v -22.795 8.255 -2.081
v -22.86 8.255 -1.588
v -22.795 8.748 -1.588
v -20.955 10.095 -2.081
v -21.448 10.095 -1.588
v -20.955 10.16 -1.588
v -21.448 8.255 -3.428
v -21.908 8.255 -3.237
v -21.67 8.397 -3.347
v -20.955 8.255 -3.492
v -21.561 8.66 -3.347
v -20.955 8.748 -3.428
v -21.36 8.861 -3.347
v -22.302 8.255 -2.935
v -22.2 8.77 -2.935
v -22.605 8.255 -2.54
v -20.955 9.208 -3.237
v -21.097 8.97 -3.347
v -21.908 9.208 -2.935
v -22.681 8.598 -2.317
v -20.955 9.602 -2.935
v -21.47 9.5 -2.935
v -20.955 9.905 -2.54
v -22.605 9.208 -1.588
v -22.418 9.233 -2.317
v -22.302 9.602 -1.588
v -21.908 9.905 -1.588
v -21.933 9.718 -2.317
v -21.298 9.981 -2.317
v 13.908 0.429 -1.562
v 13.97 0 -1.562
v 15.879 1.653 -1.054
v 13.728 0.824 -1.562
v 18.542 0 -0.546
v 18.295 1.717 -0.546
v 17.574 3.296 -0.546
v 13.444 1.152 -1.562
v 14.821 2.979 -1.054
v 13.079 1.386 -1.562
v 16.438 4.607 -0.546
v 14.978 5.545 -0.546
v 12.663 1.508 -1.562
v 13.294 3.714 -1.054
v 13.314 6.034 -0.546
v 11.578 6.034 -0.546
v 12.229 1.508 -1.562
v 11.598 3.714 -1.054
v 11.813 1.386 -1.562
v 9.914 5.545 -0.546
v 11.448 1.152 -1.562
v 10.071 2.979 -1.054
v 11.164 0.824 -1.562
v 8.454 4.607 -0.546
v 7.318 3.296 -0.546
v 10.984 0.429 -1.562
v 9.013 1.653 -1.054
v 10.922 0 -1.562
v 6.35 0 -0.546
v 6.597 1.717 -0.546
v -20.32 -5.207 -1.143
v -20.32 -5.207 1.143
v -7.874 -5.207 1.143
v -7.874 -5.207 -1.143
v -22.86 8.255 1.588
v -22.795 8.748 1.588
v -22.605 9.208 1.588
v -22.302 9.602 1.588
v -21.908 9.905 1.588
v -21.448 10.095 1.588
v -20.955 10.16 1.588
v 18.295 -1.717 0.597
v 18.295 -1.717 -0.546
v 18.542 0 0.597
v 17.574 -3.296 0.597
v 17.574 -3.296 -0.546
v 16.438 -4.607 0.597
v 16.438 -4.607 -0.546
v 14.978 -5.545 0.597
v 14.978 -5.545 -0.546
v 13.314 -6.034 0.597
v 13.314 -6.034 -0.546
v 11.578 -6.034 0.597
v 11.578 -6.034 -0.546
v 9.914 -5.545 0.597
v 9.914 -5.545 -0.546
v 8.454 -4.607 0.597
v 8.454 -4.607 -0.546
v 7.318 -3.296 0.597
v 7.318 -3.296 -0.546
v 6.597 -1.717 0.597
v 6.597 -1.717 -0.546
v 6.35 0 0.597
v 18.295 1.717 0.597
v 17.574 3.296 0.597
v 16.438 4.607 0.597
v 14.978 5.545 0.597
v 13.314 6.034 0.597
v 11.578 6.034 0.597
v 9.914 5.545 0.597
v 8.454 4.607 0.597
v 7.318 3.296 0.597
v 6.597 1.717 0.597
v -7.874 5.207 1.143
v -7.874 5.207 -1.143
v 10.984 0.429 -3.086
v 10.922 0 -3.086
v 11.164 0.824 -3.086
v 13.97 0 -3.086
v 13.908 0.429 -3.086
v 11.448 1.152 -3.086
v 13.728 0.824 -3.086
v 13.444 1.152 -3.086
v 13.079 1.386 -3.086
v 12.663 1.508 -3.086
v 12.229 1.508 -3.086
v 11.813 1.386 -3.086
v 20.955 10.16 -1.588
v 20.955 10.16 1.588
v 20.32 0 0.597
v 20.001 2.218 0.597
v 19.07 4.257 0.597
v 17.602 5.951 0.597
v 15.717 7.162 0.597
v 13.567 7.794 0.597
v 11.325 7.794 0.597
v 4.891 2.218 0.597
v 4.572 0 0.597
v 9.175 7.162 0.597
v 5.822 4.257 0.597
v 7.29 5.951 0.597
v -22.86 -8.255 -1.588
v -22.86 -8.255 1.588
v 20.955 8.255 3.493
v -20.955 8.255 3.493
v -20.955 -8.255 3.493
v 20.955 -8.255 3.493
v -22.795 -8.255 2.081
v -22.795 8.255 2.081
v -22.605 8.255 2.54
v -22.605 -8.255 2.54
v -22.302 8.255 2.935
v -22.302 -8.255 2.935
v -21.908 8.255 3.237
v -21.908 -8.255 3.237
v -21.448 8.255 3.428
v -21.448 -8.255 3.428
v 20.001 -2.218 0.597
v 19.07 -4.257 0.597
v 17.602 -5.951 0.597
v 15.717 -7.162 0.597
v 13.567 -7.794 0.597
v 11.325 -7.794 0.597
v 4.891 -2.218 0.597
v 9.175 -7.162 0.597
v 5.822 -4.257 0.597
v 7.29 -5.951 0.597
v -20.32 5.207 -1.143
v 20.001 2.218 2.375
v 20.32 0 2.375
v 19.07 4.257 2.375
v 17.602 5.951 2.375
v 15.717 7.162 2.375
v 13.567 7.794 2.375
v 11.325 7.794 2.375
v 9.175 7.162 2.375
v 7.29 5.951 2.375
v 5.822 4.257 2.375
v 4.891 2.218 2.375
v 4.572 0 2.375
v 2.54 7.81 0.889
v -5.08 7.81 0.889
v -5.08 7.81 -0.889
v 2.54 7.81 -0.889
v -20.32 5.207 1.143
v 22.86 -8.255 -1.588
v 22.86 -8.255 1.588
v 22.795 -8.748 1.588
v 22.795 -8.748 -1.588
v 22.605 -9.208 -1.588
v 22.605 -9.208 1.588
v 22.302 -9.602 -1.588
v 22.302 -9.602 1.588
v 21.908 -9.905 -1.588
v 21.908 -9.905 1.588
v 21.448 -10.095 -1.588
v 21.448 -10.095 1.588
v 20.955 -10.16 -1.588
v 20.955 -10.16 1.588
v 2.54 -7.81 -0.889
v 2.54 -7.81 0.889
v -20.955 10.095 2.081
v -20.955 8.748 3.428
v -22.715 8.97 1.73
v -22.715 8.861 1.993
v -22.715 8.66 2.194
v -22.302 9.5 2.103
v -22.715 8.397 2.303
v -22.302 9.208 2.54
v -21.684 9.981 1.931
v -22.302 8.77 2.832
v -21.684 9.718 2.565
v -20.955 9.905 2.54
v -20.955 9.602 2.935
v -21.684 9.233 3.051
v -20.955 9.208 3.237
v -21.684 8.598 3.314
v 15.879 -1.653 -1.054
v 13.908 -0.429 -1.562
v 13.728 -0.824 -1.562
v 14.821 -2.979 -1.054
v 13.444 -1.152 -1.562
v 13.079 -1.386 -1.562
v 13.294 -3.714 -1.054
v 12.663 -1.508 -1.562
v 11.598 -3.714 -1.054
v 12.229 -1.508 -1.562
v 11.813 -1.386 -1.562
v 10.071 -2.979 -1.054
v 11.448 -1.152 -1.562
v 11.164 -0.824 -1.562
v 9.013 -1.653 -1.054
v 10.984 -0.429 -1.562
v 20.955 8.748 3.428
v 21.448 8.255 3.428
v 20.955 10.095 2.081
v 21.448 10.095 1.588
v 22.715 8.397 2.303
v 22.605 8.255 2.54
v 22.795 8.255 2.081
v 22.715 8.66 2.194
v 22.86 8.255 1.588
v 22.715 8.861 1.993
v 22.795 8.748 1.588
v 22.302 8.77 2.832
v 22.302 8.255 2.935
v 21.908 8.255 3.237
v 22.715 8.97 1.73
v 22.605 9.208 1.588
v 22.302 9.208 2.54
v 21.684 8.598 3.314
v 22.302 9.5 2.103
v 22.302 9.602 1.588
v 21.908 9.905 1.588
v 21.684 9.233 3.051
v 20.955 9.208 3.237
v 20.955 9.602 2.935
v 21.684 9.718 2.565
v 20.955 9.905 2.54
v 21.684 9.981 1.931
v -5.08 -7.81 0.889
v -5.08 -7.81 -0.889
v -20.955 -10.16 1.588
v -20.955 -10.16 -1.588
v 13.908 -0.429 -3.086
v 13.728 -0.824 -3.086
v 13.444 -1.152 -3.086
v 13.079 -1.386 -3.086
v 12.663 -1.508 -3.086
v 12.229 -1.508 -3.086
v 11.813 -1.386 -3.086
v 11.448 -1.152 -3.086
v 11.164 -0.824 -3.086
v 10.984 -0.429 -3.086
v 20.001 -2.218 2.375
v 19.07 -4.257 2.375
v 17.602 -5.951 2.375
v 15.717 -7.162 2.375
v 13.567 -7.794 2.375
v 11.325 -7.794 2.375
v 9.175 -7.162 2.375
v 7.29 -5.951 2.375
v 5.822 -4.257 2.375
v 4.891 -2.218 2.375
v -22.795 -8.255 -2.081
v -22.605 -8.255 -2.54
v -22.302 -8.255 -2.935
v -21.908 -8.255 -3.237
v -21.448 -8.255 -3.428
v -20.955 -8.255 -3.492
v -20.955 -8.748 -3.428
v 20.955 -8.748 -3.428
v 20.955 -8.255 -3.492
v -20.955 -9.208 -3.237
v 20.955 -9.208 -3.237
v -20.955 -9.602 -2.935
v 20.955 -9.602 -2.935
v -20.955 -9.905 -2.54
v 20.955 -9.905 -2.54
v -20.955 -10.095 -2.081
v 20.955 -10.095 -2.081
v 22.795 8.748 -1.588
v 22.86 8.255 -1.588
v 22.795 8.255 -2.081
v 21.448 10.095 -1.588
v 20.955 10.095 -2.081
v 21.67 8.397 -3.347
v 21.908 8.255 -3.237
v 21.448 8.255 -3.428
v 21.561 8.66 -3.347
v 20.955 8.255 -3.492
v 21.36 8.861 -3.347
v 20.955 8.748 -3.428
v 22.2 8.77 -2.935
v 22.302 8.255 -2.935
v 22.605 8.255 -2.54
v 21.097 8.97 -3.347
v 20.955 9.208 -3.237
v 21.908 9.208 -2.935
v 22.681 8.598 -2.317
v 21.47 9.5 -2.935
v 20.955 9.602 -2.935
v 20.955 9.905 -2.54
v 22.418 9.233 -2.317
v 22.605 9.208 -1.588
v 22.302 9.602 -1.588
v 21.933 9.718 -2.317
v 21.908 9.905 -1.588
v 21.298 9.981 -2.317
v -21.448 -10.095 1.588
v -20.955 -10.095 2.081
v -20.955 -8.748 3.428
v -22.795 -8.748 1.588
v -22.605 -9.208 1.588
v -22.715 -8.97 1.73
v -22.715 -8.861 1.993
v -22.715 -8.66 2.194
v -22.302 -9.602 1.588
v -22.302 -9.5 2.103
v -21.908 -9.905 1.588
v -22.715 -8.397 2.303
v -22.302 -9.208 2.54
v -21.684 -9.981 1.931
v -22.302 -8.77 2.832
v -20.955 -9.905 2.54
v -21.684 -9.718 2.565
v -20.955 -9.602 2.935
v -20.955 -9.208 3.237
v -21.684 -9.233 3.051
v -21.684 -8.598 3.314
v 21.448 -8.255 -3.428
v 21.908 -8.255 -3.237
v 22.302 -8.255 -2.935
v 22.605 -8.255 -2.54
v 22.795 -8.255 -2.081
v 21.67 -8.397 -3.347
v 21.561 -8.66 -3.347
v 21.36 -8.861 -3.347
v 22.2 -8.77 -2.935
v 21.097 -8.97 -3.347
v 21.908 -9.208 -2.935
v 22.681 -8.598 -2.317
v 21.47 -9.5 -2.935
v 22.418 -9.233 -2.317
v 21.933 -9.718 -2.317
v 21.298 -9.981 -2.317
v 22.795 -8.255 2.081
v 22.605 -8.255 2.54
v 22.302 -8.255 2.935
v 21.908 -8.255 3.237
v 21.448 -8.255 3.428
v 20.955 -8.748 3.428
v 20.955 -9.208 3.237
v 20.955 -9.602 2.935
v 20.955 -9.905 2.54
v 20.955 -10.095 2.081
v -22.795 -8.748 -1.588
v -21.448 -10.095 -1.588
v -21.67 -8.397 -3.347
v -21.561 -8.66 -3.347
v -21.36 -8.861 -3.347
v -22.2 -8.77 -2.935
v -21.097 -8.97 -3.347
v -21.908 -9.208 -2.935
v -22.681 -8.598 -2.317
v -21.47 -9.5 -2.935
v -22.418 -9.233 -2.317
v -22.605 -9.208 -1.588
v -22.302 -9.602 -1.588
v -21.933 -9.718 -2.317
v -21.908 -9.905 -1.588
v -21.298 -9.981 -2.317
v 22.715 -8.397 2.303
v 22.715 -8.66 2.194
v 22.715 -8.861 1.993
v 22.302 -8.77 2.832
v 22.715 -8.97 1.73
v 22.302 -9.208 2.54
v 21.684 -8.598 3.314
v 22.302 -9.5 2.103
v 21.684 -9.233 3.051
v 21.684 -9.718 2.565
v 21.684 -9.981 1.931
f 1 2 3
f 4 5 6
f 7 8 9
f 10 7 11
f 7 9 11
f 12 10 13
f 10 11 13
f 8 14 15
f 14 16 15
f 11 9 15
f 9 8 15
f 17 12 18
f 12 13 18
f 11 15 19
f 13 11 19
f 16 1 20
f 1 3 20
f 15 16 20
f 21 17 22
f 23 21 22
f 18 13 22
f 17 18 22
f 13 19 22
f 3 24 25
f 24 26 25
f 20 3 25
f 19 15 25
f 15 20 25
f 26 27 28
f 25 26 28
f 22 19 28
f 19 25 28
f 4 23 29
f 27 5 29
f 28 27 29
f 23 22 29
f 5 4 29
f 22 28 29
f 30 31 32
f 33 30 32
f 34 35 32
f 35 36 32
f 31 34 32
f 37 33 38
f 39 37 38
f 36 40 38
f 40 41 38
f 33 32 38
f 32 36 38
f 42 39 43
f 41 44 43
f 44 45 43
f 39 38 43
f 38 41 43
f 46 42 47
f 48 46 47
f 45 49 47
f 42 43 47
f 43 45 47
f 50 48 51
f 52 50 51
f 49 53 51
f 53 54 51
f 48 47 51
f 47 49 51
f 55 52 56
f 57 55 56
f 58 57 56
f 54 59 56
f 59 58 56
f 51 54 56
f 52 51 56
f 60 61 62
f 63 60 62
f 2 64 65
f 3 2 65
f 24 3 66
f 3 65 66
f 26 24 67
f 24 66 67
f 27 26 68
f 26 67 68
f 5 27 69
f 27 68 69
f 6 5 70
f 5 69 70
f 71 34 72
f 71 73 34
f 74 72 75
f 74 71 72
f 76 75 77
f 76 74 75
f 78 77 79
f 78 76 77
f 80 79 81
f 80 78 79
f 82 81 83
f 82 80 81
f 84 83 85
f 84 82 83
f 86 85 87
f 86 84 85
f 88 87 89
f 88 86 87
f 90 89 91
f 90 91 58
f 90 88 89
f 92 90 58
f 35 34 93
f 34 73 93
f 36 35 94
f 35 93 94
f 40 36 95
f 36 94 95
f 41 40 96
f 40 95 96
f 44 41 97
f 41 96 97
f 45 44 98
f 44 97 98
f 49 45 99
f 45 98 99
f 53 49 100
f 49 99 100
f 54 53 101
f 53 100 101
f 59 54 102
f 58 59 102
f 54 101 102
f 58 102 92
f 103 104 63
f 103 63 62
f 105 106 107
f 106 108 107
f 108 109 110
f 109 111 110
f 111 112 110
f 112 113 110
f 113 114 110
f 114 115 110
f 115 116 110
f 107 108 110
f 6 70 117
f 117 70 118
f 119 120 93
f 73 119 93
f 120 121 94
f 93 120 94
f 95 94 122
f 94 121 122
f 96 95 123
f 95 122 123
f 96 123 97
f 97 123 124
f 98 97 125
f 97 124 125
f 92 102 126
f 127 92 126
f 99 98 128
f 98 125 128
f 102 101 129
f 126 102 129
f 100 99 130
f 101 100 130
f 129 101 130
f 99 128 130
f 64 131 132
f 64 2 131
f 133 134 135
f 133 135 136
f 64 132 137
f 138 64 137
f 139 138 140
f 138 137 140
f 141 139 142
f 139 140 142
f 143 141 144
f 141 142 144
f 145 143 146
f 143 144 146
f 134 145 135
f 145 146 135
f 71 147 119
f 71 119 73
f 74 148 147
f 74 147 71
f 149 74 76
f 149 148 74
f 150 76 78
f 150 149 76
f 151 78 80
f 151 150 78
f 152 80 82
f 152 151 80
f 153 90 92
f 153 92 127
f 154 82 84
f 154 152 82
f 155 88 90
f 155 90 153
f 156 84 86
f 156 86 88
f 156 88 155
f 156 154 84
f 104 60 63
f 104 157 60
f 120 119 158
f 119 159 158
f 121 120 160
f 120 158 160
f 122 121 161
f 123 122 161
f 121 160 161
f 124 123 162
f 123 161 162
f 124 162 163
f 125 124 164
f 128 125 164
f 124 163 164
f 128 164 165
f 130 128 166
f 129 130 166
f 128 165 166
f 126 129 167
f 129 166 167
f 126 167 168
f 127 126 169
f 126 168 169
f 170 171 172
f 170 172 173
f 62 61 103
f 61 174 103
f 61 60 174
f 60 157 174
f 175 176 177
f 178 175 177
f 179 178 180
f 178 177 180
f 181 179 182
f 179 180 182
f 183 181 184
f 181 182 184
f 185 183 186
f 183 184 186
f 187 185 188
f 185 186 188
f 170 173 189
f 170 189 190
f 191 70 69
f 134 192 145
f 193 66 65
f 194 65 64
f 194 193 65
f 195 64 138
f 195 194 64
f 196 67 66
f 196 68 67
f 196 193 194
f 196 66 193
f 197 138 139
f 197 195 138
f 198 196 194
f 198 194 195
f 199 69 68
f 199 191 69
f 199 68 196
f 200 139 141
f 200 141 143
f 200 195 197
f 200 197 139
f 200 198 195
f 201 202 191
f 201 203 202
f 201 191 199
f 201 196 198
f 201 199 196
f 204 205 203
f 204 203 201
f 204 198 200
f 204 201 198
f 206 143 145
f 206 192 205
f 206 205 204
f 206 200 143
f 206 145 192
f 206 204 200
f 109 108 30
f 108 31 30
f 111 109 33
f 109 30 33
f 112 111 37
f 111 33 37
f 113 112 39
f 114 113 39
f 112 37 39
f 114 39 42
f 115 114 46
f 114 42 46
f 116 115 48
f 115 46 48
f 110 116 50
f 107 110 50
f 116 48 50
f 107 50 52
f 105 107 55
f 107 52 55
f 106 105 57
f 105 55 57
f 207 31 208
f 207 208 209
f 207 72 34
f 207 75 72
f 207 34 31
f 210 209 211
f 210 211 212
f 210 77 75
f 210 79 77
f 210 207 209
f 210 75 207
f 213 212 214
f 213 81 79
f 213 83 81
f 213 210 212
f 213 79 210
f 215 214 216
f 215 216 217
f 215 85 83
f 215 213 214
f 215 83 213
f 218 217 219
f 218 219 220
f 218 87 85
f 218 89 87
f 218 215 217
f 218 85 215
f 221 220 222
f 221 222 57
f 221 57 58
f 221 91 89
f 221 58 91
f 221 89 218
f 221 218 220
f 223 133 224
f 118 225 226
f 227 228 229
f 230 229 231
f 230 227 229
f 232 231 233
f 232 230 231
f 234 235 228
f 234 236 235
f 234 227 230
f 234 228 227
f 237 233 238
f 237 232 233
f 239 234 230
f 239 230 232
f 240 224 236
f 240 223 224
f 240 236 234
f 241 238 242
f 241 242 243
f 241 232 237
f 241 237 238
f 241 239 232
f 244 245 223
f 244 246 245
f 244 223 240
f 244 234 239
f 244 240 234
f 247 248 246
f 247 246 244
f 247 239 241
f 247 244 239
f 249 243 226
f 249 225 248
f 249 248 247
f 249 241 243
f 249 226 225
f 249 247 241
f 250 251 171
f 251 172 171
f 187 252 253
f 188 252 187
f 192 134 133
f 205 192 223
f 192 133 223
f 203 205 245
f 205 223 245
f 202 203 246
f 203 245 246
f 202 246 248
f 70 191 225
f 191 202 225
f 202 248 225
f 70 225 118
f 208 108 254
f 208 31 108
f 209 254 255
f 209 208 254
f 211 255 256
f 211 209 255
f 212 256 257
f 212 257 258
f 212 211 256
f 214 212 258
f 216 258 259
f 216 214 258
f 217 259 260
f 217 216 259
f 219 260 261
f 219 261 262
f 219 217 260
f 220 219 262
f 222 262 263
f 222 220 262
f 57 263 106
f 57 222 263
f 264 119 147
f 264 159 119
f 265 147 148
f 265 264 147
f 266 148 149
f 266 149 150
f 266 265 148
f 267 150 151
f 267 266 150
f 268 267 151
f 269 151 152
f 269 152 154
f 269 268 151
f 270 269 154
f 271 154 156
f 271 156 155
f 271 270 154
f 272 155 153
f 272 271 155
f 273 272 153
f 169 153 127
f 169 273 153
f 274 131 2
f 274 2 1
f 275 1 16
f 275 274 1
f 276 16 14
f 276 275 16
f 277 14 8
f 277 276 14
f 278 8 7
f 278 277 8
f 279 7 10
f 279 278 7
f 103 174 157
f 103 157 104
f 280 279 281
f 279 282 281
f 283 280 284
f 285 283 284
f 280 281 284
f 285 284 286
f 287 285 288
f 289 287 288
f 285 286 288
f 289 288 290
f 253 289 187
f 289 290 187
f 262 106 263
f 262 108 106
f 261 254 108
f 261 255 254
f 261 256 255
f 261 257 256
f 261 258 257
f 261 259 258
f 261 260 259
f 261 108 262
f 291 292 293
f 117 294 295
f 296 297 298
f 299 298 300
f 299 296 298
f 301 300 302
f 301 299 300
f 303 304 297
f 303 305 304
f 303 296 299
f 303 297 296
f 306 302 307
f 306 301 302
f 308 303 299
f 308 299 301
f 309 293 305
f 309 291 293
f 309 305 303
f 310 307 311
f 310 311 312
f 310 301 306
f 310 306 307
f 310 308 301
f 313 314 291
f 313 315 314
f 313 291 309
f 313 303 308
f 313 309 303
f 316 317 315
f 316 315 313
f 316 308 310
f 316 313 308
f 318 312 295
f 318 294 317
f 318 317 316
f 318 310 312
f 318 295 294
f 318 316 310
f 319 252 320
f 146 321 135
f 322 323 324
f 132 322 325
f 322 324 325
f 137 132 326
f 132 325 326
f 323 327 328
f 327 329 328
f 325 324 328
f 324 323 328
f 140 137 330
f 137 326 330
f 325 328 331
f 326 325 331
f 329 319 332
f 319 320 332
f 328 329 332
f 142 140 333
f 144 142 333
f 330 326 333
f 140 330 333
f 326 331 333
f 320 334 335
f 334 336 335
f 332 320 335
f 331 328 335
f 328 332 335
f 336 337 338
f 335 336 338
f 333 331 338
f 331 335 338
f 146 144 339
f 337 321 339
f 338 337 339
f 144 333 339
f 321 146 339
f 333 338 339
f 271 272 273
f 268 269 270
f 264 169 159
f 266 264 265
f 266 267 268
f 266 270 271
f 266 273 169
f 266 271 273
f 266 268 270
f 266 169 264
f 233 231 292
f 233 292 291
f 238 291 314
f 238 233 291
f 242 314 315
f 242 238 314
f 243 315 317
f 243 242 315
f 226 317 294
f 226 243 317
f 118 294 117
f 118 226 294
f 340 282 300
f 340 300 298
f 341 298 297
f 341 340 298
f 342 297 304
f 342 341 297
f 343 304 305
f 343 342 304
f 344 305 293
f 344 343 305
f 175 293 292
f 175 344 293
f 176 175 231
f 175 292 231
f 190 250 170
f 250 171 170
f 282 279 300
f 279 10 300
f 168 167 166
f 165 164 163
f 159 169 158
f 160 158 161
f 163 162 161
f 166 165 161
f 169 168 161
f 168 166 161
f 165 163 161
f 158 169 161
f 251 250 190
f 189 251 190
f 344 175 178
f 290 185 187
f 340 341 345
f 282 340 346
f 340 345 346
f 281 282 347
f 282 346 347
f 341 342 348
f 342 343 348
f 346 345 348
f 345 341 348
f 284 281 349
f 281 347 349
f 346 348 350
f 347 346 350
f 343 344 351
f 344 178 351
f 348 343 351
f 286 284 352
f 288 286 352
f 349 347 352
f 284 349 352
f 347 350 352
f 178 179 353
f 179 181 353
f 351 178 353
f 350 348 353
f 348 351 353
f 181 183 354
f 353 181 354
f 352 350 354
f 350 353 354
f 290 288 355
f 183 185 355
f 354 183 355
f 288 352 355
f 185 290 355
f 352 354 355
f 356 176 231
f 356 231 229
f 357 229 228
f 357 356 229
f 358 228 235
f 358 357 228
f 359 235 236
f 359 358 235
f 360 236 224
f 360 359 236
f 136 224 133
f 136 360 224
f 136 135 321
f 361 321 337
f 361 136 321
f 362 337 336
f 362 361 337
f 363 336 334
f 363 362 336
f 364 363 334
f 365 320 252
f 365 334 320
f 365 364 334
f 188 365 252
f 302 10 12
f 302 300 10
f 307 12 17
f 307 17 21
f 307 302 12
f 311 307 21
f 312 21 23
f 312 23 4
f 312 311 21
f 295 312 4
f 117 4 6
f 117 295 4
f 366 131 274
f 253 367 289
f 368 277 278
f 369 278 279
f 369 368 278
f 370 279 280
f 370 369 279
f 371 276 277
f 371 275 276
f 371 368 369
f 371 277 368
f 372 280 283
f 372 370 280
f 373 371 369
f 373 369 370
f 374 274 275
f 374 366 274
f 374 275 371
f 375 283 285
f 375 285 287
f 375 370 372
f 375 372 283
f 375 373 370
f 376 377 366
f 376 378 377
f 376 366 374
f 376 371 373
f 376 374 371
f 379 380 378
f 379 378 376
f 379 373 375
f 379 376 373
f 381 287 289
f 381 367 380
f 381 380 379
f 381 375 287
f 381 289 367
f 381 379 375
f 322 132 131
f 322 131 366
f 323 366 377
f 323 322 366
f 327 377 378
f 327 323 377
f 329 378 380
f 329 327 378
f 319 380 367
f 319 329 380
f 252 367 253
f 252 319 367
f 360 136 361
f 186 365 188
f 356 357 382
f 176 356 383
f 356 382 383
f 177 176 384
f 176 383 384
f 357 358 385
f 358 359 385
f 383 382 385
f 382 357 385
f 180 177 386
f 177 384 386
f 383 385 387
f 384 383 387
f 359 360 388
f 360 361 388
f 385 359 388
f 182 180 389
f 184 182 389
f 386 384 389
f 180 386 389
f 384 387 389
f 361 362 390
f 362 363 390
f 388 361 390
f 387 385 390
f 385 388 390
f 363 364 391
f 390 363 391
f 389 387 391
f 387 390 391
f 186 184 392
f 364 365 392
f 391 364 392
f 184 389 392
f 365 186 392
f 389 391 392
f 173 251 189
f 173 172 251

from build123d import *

# Parameters (mm, degrees)
F0_W     = 45.72
F0_H     = 6.985
F1_DEPTH = 10.16
F2_R     = 1.905
F6_ANGLE = 180
F3_W     = 12.446
F3_H     = 2.286
F7_DEPTH = 5.207
F4_W     = 7.62
F4_H     = 1.778
F8_DEPTH = 7.8105


# Not quite as in the source:
# - a length typed as a fraction of an inch, garbled in the dataset ("3 / 203.2 mm" for 3/8 in), is restored


with BuildPart() as f1:
    # F0 (on Front) → F1 (new body)
    with BuildSketch(Plane.XZ):
        Rectangle(F0_W, F0_H)
    extrude(amount=-F1_DEPTH)

    # F2
    f2_edges = [f1.edges().sort_by_distance(p)[0] for p in [
        (0, 10.16, 3.4925),
        (22.86, 5.08, 3.4925),
        (22.86, 10.16, 0),
        (22.86, 5.08, -3.4925),
        (-22.86, 10.16, 0),
        (-22.86, 5.08, -3.4925),
        (-22.86, 5.08, 3.4925),
        (0, 10.16, -3.4925),
    ]]
    fillet(f2_edges, radius=F2_R)

    # F5 (on face) → F6 (revolve, cut)
    with BuildSketch(Plane.XZ):
        Polygon((13.97, -1.5621), (18.542, -0.5461), (18.542, 0.5969), (20.32, 0.5969), (20.32, 2.3749), (12.446, 2.3749), (12.446, -3.0861), (13.97, -3.0861), align=None)
    revolve(axis=Axis((12.446, 0, -0.3556), (0, 0, 1)), revolution_arc=F6_ANGLE, mode=Mode.SUBTRACT)

    # F3 (on face) → F7 (cut)
    with BuildSketch(Plane.XZ):
        with Locations((-14.097, 0)):
            Rectangle(F3_W, F3_H)
    extrude(amount=-F7_DEPTH, mode=Mode.SUBTRACT)

    # F4 (on face) → F8 (cut)
    with BuildSketch(Plane.XZ):
        with Locations((-1.27, 0)):
            Rectangle(F4_W, F4_H)
    extrude(amount=-F8_DEPTH, mode=Mode.SUBTRACT)

    # F9: F1 across face


with BuildPart() as f1_1:
    add(f1.part)
    add(f1.part.mirror(Plane(origin=(-1.1723055417, 0, -0.108173269), x_dir=(1, 0, 0), z_dir=(0, -1, 0))))


solid = f1_1.part
